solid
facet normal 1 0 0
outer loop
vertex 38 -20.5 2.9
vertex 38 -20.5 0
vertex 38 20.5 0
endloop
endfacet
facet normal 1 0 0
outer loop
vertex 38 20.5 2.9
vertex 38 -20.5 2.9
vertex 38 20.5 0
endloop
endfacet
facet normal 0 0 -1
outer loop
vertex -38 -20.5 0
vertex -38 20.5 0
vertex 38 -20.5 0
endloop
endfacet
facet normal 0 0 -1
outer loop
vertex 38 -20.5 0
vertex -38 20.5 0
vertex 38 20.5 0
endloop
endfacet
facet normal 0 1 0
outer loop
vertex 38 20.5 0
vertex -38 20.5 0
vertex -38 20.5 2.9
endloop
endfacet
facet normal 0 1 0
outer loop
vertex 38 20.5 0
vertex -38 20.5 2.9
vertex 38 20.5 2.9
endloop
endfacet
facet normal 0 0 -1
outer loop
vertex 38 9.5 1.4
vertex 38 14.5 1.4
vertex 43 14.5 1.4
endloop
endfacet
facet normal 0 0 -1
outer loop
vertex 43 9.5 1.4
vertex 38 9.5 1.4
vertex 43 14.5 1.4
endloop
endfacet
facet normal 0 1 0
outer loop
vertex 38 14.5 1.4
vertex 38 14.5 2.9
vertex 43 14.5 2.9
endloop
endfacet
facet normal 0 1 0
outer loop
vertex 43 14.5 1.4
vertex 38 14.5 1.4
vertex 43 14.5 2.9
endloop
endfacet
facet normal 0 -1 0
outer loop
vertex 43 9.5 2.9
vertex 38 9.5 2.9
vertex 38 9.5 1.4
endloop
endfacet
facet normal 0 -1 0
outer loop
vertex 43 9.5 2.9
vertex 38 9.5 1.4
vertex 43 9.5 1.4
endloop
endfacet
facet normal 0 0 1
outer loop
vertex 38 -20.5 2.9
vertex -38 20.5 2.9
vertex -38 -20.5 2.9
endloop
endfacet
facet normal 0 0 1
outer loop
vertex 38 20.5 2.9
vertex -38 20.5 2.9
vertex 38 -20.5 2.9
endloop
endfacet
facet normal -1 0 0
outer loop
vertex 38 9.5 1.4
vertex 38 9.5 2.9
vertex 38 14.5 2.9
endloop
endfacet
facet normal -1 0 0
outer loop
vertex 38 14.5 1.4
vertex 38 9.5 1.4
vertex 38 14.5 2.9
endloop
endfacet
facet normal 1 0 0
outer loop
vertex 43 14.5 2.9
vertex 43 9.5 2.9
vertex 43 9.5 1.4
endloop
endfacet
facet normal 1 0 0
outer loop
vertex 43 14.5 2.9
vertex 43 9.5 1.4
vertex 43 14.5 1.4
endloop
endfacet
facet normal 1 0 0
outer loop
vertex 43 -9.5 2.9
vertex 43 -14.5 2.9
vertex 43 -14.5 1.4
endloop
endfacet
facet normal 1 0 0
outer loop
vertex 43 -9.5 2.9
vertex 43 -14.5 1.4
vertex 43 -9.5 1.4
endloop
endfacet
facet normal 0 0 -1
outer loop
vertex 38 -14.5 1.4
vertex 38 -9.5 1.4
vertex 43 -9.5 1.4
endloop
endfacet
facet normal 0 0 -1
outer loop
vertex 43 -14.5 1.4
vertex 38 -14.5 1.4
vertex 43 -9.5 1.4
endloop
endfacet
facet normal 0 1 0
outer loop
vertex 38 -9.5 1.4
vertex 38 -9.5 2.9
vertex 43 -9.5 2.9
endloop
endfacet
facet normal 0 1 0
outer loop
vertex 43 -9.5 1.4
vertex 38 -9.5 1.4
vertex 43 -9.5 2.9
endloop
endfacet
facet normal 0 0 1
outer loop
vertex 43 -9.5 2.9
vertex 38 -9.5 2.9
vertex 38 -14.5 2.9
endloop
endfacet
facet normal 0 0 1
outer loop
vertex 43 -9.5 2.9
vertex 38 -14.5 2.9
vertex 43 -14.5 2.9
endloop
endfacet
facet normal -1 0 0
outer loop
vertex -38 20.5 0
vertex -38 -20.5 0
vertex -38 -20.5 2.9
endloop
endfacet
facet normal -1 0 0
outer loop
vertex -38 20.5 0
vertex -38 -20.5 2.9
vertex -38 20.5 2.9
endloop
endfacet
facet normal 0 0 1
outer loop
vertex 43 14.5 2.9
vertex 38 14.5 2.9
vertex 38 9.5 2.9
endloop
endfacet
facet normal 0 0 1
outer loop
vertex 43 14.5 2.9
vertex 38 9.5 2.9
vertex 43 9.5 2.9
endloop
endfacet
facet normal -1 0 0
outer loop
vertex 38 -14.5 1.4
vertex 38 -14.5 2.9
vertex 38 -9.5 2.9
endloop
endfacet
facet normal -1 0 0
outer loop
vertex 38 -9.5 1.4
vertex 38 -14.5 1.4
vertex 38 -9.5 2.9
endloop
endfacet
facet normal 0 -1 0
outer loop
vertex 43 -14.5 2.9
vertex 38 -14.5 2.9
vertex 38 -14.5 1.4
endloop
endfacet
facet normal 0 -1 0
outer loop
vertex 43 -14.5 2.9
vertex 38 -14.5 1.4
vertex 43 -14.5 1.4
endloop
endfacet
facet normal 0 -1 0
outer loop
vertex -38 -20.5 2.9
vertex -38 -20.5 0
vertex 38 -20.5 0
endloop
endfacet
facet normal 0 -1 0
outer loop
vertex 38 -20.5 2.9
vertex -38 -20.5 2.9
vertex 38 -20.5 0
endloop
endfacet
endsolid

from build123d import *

# Parameters (mm, degrees)
SKETCH_1_W        = 76
SKETCH_1_H        = 41
EXTRUDE_1_DEPTH   = 2.9
SKETCH_2_W        = 5
SKETCH_2_H        = 5
EXTRUDE_2_DEPTH   = 1.5
EXTRUDE_2_2_DEPTH = 1.5


with BuildPart() as part:
    # 草图1 → 凸台-拉伸1 (new body)
    with BuildSketch(Plane.XY):
        Rectangle(SKETCH_1_W, SKETCH_1_H)
    extrude(amount=EXTRUDE_1_DEPTH)


with BuildPart() as body_2:
    # 草图2 → 凸台-拉伸2 (new body)
    with BuildSketch(Plane.XY.offset(2.9)):
        with Locations((40.5, 12)):
            Rectangle(SKETCH_2_W, SKETCH_2_H)
    extrude(amount=-EXTRUDE_2_DEPTH)


with BuildPart() as body_3:
    # 草图2 → Extrude 2 2 (new body)
    with BuildSketch(Plane.XY.offset(2.9)):
        with Locations((40.5, -12)):
            Rectangle(SKETCH_2_W, SKETCH_2_H)
    extrude(amount=-EXTRUDE_2_2_DEPTH)


solid = Compound([part.part, body_2.part, body_3.part])
